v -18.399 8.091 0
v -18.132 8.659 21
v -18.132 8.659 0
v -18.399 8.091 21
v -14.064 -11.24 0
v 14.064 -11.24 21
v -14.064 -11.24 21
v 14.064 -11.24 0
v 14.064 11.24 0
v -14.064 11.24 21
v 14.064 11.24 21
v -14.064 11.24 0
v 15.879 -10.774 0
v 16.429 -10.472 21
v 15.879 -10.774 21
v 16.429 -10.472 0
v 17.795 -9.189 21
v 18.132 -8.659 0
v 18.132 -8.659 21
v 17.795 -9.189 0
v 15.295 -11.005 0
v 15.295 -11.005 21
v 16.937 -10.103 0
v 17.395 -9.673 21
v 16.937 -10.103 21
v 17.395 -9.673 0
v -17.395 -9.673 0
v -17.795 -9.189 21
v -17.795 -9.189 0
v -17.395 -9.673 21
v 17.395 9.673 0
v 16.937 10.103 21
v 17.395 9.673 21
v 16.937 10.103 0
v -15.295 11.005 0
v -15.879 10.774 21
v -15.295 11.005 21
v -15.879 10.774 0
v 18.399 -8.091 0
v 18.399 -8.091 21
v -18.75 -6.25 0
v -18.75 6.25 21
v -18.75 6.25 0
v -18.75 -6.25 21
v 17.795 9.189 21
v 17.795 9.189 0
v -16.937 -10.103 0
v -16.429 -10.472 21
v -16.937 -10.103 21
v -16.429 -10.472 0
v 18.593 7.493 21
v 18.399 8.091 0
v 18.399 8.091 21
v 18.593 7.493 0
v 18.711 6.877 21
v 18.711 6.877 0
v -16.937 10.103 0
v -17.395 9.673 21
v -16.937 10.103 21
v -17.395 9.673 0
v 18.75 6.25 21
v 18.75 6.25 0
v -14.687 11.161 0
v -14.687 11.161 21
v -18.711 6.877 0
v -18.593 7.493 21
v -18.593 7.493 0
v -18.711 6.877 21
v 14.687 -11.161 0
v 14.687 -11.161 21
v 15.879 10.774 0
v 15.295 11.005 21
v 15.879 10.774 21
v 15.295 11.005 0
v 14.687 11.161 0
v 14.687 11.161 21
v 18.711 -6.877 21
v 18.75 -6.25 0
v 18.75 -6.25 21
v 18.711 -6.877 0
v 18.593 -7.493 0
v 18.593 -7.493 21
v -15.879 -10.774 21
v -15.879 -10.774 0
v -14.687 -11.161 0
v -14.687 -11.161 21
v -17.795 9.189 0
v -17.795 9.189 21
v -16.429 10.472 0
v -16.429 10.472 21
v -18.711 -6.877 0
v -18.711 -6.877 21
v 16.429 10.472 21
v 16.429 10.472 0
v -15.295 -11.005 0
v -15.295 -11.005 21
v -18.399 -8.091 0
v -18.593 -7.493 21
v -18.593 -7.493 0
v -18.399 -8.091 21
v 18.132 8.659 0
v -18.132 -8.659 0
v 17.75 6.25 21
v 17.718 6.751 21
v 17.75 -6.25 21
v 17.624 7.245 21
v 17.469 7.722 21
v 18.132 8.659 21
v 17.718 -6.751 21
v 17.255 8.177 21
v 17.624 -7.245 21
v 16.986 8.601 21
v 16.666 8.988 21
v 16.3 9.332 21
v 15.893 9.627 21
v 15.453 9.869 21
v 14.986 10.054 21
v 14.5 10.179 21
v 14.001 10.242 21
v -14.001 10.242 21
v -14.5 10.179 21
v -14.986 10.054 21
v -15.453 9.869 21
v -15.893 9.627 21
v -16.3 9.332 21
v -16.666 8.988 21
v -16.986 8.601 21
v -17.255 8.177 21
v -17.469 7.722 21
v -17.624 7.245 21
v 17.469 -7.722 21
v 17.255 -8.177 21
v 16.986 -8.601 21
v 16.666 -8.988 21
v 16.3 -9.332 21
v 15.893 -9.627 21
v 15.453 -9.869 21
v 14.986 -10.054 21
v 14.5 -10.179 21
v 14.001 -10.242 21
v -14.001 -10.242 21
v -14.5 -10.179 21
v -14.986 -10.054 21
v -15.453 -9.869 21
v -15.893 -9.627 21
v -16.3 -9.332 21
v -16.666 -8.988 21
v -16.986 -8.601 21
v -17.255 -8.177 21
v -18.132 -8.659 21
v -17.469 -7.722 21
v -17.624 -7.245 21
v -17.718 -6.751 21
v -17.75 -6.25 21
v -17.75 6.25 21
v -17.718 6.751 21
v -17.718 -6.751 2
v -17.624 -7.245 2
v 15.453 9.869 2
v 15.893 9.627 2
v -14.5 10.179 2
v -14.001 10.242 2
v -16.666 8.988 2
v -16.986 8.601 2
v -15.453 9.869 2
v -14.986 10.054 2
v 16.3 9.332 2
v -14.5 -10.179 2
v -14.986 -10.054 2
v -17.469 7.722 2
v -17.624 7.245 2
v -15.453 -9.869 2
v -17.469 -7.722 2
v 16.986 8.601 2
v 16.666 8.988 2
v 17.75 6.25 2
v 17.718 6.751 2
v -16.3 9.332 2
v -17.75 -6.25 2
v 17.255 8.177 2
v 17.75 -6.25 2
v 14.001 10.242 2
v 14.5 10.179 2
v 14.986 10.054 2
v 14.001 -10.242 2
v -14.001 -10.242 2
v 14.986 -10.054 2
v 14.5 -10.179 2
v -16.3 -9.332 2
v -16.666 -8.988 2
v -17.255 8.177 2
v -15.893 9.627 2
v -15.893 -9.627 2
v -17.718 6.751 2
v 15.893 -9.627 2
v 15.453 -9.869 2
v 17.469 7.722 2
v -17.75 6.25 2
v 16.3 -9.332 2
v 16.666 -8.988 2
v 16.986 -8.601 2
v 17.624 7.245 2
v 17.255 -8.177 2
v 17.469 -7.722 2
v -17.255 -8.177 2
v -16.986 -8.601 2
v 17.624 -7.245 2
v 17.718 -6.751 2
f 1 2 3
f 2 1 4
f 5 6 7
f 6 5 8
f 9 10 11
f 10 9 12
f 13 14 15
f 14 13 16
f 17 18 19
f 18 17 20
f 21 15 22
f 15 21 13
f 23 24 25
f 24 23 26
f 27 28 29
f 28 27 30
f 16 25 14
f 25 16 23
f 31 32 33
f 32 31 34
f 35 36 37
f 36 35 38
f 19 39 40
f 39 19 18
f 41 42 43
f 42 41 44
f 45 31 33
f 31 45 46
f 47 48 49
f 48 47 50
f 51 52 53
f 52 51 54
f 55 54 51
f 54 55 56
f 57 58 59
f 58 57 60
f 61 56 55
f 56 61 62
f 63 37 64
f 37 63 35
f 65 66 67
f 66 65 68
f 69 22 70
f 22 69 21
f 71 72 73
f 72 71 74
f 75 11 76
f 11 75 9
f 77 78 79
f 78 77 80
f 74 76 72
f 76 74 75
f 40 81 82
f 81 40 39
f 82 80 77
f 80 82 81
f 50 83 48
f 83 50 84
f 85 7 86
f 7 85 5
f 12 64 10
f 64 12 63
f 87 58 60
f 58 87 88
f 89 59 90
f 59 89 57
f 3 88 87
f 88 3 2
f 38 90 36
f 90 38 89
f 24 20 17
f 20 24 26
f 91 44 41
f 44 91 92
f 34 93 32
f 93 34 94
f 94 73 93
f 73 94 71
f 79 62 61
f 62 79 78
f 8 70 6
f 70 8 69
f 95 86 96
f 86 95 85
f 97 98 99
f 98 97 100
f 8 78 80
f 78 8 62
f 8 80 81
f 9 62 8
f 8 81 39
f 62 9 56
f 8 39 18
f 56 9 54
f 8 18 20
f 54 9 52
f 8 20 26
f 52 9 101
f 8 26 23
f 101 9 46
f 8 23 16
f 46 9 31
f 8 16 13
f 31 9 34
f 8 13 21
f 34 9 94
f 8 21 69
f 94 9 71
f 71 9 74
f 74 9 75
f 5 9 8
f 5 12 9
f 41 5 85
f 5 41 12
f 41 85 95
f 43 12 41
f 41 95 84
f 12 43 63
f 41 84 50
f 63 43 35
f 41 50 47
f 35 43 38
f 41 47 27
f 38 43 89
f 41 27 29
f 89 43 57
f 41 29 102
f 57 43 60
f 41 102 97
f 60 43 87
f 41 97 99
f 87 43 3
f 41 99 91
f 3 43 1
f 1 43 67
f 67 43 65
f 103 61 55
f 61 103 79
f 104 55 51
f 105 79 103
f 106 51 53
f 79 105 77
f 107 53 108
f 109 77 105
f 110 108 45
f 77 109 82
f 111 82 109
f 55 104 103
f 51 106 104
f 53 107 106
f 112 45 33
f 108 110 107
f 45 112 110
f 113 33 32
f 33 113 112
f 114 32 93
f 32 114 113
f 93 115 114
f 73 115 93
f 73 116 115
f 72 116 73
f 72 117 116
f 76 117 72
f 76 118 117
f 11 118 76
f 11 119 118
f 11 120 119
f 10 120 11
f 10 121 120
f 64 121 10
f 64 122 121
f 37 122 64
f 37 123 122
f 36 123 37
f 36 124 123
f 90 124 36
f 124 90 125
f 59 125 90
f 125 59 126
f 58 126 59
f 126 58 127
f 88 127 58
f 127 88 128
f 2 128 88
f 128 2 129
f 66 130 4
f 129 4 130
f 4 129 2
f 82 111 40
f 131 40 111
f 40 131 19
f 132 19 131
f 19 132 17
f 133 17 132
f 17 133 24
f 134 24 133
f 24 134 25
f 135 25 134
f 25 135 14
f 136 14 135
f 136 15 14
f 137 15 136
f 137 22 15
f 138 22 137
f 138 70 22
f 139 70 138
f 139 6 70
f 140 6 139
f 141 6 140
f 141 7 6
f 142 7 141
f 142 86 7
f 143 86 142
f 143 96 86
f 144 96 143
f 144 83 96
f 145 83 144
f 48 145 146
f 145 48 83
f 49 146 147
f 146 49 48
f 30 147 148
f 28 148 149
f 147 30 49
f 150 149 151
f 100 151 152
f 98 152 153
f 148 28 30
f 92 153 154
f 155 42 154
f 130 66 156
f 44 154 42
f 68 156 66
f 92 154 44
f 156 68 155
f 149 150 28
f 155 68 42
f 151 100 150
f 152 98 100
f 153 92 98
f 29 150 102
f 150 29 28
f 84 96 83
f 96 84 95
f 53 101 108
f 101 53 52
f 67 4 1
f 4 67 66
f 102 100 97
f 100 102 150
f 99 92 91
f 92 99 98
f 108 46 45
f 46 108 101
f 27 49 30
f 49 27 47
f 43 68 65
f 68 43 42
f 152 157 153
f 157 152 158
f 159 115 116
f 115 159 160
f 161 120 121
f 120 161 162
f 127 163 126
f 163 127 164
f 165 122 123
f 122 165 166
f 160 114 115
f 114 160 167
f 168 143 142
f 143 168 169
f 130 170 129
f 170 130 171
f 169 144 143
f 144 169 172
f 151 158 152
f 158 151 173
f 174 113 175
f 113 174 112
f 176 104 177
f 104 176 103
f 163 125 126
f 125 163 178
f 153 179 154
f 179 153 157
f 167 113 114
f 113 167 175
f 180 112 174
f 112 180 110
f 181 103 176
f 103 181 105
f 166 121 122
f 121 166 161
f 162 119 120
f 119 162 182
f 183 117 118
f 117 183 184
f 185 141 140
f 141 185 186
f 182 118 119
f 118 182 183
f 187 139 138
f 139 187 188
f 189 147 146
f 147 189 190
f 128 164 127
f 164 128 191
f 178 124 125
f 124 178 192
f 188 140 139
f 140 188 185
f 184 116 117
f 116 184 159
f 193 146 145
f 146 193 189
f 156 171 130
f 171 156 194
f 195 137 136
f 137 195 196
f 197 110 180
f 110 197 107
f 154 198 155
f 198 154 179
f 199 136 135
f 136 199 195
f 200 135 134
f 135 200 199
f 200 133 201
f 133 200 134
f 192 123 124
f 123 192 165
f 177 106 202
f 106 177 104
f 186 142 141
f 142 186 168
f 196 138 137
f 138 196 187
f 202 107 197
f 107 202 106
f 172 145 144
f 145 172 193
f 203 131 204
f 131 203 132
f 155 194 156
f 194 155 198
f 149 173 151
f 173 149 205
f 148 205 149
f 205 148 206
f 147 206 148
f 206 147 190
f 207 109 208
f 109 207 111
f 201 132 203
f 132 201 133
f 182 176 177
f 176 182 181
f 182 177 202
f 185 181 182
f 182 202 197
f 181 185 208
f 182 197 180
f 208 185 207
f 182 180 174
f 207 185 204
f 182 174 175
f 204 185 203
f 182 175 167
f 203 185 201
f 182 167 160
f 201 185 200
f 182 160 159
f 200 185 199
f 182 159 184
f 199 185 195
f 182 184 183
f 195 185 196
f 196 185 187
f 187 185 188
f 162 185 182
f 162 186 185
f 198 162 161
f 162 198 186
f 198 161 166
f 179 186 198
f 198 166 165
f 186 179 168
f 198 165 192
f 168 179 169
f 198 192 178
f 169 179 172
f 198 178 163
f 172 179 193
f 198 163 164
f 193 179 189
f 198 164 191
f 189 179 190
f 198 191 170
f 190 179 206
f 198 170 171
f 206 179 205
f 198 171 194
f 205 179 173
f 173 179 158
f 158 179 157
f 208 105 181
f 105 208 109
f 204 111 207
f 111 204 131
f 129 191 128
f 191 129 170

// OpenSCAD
$fn = 50;


difference() {
	union() {
		hull() {
			translate(v = [-13.7500000000, 6.2500000000, 0]) {
				cylinder(h = 21, r = 5);
			}
			translate(v = [13.7500000000, 6.2500000000, 0]) {
				cylinder(h = 21, r = 5);
			}
			translate(v = [-13.7500000000, -6.2500000000, 0]) {
				cylinder(h = 21, r = 5);
			}
			translate(v = [13.7500000000, -6.2500000000, 0]) {
				cylinder(h = 21, r = 5);
			}
		}
	}
	union() {
		translate(v = [0, 0, 2]) {
			hull() {
				translate(v = [-13.7500000000, 6.2500000000, 0]) {
					cylinder(h = 19, r = 4);
				}
				translate(v = [13.7500000000, 6.2500000000, 0]) {
					cylinder(h = 19, r = 4);
				}
				translate(v = [-13.7500000000, -6.2500000000, 0]) {
					cylinder(h = 19, r = 4);
				}
				translate(v = [13.7500000000, -6.2500000000, 0]) {
					cylinder(h = 19, r = 4);
				}
			}
		}
	}
}
